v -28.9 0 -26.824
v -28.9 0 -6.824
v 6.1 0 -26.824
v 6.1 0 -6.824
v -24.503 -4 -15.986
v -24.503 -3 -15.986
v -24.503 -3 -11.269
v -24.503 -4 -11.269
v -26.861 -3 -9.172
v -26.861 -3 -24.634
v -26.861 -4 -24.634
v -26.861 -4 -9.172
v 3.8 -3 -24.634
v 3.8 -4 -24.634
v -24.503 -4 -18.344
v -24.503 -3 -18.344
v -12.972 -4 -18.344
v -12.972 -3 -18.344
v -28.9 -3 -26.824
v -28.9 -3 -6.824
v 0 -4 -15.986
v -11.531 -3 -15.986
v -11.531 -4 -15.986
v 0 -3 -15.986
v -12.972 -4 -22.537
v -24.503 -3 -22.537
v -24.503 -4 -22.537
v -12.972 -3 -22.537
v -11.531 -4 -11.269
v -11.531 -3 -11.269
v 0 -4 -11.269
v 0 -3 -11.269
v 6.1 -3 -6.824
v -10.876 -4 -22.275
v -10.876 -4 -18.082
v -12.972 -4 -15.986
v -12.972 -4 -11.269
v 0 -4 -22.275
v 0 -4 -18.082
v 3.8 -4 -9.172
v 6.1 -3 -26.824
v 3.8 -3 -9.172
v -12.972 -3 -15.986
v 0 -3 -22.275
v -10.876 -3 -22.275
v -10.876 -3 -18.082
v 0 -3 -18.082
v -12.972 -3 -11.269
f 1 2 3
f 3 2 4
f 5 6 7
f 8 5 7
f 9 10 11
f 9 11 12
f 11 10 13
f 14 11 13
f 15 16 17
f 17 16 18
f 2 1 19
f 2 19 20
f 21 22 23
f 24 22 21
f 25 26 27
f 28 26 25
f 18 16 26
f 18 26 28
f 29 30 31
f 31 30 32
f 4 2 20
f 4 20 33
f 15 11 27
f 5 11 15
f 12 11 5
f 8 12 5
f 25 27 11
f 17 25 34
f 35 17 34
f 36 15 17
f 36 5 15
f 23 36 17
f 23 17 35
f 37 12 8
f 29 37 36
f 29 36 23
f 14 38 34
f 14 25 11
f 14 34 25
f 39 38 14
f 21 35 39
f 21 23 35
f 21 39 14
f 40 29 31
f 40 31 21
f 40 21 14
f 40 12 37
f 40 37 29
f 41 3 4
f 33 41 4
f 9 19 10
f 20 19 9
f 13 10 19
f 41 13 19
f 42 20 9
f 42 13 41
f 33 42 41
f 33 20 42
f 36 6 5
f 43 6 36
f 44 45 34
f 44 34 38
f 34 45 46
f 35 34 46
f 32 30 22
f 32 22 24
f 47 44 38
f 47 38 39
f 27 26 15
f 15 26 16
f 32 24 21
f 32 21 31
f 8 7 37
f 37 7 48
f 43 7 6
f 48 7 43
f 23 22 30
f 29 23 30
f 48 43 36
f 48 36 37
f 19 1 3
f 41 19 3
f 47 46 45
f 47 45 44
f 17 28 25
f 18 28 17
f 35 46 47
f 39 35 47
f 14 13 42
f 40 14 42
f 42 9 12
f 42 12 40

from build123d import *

# Parameters (mm, degrees)
F0_W        = 30.6613992434
F0_H        = 15.4617307708
F0_W_2      = 11.5307830274
F0_H_2      = 4.1930116713
F0_W_3      = 10.8756236732
F0_H_3      = 4.7171385959
F0_W_4      = 11.5307817468
F1_DEPTH    = 1
F0_W_5      = 35
F0_H_4      = 20
F2_DEPTH    = 2
F1_FACE_W   = 30.6613992434
F1_FACE_H   = 15.4617307708
F1_FACE_W_2 = 11.5307830274
F1_FACE_H_2 = 4.1930116713
F1_FACE_W_3 = 10.8756236732
F1_FACE_H_3 = 4.7171385959
F1_FACE_W_4 = 11.5307817468
F3_DEPTH    = 3


with BuildPart() as f1:
    # F0 (on Front) → F1 (new body)
    with BuildSketch(Plane.XZ):
        with Locations((-11.5307817468, -16.9030786492)):
            Rectangle(F0_W, F0_H)
        with Locations((-18.7375210226, -20.4409323633)):
            Rectangle(F0_W_2, F0_H_2, mode=Mode.SUBTRACT)
        with Locations((-5.4378118366, -20.1788693666)):
            Rectangle(F0_W_3, F0_H_2, mode=Mode.SUBTRACT)
        with Locations((-18.7375210226, -13.6272883974)):
            Rectangle(F0_W_2, F0_H_3, mode=Mode.SUBTRACT)
        with Locations((-5.7653908734, -13.6272883974)):
            Rectangle(F0_W_4, F0_H_3, mode=Mode.SUBTRACT)
    extrude(amount=F1_DEPTH)

    # F0 (on Front) → F2 (join)
    with BuildSketch(Plane.XZ):
        with Locations((-11.3997505978, -16.8241263426)):
            Rectangle(F0_W_5, F0_H_4)
        with Locations((-11.5307817468, -16.9030786492)):
            Rectangle(F0_W, F0_H, mode=Mode.SUBTRACT)
    extrude(amount=F2_DEPTH)

    # F0 (on Front) + F1_face (on face) → F3 (join)
    with BuildSketch(Plane.XZ):
        with Locations((-11.3997505978, -16.8241263426)):
            Rectangle(F0_W_5, F0_H_4)
        with Locations((-11.5307817468, -16.9030786492)):
            Rectangle(F0_W, F0_H, mode=Mode.SUBTRACT)
        with Locations((-5.7653908734, -13.6272883974)):
            Rectangle(F0_W_4, F0_H_3)
        with Locations((-18.7375210226, -20.4409323633)):
            Rectangle(F0_W_2, F0_H_2)
        with Locations((-5.4378118366, -20.1788693666)):
            Rectangle(F0_W_3, F0_H_2)
        with Locations((-18.7375210226, -13.6272883974)):
            Rectangle(F0_W_2, F0_H_3)
    with BuildSketch(Plane(origin=(-10.9817153045, -1, -17.0354699919), x_dir=(1, 0, 0), z_dir=(0, -1, 0))):
        with Locations((-0.5490664423, 0.1323913427)):
            Rectangle(F1_FACE_W, F1_FACE_H)
        with Locations((-7.755805718, -3.4054623714)):
            Rectangle(F1_FACE_W_2, F1_FACE_H_2, mode=Mode.SUBTRACT)
        with Locations((5.5439034679, -3.1433993748)):
            Rectangle(F1_FACE_W_3, F1_FACE_H_2, mode=Mode.SUBTRACT)
        with Locations((-7.755805718, 3.4081815945)):
            Rectangle(F1_FACE_W_2, F1_FACE_H_3, mode=Mode.SUBTRACT)
        with Locations((5.2163244311, 3.4081815945)):
            Rectangle(F1_FACE_W_4, F1_FACE_H_3, mode=Mode.SUBTRACT)
    extrude(amount=F3_DEPTH)


solid = f1.part
